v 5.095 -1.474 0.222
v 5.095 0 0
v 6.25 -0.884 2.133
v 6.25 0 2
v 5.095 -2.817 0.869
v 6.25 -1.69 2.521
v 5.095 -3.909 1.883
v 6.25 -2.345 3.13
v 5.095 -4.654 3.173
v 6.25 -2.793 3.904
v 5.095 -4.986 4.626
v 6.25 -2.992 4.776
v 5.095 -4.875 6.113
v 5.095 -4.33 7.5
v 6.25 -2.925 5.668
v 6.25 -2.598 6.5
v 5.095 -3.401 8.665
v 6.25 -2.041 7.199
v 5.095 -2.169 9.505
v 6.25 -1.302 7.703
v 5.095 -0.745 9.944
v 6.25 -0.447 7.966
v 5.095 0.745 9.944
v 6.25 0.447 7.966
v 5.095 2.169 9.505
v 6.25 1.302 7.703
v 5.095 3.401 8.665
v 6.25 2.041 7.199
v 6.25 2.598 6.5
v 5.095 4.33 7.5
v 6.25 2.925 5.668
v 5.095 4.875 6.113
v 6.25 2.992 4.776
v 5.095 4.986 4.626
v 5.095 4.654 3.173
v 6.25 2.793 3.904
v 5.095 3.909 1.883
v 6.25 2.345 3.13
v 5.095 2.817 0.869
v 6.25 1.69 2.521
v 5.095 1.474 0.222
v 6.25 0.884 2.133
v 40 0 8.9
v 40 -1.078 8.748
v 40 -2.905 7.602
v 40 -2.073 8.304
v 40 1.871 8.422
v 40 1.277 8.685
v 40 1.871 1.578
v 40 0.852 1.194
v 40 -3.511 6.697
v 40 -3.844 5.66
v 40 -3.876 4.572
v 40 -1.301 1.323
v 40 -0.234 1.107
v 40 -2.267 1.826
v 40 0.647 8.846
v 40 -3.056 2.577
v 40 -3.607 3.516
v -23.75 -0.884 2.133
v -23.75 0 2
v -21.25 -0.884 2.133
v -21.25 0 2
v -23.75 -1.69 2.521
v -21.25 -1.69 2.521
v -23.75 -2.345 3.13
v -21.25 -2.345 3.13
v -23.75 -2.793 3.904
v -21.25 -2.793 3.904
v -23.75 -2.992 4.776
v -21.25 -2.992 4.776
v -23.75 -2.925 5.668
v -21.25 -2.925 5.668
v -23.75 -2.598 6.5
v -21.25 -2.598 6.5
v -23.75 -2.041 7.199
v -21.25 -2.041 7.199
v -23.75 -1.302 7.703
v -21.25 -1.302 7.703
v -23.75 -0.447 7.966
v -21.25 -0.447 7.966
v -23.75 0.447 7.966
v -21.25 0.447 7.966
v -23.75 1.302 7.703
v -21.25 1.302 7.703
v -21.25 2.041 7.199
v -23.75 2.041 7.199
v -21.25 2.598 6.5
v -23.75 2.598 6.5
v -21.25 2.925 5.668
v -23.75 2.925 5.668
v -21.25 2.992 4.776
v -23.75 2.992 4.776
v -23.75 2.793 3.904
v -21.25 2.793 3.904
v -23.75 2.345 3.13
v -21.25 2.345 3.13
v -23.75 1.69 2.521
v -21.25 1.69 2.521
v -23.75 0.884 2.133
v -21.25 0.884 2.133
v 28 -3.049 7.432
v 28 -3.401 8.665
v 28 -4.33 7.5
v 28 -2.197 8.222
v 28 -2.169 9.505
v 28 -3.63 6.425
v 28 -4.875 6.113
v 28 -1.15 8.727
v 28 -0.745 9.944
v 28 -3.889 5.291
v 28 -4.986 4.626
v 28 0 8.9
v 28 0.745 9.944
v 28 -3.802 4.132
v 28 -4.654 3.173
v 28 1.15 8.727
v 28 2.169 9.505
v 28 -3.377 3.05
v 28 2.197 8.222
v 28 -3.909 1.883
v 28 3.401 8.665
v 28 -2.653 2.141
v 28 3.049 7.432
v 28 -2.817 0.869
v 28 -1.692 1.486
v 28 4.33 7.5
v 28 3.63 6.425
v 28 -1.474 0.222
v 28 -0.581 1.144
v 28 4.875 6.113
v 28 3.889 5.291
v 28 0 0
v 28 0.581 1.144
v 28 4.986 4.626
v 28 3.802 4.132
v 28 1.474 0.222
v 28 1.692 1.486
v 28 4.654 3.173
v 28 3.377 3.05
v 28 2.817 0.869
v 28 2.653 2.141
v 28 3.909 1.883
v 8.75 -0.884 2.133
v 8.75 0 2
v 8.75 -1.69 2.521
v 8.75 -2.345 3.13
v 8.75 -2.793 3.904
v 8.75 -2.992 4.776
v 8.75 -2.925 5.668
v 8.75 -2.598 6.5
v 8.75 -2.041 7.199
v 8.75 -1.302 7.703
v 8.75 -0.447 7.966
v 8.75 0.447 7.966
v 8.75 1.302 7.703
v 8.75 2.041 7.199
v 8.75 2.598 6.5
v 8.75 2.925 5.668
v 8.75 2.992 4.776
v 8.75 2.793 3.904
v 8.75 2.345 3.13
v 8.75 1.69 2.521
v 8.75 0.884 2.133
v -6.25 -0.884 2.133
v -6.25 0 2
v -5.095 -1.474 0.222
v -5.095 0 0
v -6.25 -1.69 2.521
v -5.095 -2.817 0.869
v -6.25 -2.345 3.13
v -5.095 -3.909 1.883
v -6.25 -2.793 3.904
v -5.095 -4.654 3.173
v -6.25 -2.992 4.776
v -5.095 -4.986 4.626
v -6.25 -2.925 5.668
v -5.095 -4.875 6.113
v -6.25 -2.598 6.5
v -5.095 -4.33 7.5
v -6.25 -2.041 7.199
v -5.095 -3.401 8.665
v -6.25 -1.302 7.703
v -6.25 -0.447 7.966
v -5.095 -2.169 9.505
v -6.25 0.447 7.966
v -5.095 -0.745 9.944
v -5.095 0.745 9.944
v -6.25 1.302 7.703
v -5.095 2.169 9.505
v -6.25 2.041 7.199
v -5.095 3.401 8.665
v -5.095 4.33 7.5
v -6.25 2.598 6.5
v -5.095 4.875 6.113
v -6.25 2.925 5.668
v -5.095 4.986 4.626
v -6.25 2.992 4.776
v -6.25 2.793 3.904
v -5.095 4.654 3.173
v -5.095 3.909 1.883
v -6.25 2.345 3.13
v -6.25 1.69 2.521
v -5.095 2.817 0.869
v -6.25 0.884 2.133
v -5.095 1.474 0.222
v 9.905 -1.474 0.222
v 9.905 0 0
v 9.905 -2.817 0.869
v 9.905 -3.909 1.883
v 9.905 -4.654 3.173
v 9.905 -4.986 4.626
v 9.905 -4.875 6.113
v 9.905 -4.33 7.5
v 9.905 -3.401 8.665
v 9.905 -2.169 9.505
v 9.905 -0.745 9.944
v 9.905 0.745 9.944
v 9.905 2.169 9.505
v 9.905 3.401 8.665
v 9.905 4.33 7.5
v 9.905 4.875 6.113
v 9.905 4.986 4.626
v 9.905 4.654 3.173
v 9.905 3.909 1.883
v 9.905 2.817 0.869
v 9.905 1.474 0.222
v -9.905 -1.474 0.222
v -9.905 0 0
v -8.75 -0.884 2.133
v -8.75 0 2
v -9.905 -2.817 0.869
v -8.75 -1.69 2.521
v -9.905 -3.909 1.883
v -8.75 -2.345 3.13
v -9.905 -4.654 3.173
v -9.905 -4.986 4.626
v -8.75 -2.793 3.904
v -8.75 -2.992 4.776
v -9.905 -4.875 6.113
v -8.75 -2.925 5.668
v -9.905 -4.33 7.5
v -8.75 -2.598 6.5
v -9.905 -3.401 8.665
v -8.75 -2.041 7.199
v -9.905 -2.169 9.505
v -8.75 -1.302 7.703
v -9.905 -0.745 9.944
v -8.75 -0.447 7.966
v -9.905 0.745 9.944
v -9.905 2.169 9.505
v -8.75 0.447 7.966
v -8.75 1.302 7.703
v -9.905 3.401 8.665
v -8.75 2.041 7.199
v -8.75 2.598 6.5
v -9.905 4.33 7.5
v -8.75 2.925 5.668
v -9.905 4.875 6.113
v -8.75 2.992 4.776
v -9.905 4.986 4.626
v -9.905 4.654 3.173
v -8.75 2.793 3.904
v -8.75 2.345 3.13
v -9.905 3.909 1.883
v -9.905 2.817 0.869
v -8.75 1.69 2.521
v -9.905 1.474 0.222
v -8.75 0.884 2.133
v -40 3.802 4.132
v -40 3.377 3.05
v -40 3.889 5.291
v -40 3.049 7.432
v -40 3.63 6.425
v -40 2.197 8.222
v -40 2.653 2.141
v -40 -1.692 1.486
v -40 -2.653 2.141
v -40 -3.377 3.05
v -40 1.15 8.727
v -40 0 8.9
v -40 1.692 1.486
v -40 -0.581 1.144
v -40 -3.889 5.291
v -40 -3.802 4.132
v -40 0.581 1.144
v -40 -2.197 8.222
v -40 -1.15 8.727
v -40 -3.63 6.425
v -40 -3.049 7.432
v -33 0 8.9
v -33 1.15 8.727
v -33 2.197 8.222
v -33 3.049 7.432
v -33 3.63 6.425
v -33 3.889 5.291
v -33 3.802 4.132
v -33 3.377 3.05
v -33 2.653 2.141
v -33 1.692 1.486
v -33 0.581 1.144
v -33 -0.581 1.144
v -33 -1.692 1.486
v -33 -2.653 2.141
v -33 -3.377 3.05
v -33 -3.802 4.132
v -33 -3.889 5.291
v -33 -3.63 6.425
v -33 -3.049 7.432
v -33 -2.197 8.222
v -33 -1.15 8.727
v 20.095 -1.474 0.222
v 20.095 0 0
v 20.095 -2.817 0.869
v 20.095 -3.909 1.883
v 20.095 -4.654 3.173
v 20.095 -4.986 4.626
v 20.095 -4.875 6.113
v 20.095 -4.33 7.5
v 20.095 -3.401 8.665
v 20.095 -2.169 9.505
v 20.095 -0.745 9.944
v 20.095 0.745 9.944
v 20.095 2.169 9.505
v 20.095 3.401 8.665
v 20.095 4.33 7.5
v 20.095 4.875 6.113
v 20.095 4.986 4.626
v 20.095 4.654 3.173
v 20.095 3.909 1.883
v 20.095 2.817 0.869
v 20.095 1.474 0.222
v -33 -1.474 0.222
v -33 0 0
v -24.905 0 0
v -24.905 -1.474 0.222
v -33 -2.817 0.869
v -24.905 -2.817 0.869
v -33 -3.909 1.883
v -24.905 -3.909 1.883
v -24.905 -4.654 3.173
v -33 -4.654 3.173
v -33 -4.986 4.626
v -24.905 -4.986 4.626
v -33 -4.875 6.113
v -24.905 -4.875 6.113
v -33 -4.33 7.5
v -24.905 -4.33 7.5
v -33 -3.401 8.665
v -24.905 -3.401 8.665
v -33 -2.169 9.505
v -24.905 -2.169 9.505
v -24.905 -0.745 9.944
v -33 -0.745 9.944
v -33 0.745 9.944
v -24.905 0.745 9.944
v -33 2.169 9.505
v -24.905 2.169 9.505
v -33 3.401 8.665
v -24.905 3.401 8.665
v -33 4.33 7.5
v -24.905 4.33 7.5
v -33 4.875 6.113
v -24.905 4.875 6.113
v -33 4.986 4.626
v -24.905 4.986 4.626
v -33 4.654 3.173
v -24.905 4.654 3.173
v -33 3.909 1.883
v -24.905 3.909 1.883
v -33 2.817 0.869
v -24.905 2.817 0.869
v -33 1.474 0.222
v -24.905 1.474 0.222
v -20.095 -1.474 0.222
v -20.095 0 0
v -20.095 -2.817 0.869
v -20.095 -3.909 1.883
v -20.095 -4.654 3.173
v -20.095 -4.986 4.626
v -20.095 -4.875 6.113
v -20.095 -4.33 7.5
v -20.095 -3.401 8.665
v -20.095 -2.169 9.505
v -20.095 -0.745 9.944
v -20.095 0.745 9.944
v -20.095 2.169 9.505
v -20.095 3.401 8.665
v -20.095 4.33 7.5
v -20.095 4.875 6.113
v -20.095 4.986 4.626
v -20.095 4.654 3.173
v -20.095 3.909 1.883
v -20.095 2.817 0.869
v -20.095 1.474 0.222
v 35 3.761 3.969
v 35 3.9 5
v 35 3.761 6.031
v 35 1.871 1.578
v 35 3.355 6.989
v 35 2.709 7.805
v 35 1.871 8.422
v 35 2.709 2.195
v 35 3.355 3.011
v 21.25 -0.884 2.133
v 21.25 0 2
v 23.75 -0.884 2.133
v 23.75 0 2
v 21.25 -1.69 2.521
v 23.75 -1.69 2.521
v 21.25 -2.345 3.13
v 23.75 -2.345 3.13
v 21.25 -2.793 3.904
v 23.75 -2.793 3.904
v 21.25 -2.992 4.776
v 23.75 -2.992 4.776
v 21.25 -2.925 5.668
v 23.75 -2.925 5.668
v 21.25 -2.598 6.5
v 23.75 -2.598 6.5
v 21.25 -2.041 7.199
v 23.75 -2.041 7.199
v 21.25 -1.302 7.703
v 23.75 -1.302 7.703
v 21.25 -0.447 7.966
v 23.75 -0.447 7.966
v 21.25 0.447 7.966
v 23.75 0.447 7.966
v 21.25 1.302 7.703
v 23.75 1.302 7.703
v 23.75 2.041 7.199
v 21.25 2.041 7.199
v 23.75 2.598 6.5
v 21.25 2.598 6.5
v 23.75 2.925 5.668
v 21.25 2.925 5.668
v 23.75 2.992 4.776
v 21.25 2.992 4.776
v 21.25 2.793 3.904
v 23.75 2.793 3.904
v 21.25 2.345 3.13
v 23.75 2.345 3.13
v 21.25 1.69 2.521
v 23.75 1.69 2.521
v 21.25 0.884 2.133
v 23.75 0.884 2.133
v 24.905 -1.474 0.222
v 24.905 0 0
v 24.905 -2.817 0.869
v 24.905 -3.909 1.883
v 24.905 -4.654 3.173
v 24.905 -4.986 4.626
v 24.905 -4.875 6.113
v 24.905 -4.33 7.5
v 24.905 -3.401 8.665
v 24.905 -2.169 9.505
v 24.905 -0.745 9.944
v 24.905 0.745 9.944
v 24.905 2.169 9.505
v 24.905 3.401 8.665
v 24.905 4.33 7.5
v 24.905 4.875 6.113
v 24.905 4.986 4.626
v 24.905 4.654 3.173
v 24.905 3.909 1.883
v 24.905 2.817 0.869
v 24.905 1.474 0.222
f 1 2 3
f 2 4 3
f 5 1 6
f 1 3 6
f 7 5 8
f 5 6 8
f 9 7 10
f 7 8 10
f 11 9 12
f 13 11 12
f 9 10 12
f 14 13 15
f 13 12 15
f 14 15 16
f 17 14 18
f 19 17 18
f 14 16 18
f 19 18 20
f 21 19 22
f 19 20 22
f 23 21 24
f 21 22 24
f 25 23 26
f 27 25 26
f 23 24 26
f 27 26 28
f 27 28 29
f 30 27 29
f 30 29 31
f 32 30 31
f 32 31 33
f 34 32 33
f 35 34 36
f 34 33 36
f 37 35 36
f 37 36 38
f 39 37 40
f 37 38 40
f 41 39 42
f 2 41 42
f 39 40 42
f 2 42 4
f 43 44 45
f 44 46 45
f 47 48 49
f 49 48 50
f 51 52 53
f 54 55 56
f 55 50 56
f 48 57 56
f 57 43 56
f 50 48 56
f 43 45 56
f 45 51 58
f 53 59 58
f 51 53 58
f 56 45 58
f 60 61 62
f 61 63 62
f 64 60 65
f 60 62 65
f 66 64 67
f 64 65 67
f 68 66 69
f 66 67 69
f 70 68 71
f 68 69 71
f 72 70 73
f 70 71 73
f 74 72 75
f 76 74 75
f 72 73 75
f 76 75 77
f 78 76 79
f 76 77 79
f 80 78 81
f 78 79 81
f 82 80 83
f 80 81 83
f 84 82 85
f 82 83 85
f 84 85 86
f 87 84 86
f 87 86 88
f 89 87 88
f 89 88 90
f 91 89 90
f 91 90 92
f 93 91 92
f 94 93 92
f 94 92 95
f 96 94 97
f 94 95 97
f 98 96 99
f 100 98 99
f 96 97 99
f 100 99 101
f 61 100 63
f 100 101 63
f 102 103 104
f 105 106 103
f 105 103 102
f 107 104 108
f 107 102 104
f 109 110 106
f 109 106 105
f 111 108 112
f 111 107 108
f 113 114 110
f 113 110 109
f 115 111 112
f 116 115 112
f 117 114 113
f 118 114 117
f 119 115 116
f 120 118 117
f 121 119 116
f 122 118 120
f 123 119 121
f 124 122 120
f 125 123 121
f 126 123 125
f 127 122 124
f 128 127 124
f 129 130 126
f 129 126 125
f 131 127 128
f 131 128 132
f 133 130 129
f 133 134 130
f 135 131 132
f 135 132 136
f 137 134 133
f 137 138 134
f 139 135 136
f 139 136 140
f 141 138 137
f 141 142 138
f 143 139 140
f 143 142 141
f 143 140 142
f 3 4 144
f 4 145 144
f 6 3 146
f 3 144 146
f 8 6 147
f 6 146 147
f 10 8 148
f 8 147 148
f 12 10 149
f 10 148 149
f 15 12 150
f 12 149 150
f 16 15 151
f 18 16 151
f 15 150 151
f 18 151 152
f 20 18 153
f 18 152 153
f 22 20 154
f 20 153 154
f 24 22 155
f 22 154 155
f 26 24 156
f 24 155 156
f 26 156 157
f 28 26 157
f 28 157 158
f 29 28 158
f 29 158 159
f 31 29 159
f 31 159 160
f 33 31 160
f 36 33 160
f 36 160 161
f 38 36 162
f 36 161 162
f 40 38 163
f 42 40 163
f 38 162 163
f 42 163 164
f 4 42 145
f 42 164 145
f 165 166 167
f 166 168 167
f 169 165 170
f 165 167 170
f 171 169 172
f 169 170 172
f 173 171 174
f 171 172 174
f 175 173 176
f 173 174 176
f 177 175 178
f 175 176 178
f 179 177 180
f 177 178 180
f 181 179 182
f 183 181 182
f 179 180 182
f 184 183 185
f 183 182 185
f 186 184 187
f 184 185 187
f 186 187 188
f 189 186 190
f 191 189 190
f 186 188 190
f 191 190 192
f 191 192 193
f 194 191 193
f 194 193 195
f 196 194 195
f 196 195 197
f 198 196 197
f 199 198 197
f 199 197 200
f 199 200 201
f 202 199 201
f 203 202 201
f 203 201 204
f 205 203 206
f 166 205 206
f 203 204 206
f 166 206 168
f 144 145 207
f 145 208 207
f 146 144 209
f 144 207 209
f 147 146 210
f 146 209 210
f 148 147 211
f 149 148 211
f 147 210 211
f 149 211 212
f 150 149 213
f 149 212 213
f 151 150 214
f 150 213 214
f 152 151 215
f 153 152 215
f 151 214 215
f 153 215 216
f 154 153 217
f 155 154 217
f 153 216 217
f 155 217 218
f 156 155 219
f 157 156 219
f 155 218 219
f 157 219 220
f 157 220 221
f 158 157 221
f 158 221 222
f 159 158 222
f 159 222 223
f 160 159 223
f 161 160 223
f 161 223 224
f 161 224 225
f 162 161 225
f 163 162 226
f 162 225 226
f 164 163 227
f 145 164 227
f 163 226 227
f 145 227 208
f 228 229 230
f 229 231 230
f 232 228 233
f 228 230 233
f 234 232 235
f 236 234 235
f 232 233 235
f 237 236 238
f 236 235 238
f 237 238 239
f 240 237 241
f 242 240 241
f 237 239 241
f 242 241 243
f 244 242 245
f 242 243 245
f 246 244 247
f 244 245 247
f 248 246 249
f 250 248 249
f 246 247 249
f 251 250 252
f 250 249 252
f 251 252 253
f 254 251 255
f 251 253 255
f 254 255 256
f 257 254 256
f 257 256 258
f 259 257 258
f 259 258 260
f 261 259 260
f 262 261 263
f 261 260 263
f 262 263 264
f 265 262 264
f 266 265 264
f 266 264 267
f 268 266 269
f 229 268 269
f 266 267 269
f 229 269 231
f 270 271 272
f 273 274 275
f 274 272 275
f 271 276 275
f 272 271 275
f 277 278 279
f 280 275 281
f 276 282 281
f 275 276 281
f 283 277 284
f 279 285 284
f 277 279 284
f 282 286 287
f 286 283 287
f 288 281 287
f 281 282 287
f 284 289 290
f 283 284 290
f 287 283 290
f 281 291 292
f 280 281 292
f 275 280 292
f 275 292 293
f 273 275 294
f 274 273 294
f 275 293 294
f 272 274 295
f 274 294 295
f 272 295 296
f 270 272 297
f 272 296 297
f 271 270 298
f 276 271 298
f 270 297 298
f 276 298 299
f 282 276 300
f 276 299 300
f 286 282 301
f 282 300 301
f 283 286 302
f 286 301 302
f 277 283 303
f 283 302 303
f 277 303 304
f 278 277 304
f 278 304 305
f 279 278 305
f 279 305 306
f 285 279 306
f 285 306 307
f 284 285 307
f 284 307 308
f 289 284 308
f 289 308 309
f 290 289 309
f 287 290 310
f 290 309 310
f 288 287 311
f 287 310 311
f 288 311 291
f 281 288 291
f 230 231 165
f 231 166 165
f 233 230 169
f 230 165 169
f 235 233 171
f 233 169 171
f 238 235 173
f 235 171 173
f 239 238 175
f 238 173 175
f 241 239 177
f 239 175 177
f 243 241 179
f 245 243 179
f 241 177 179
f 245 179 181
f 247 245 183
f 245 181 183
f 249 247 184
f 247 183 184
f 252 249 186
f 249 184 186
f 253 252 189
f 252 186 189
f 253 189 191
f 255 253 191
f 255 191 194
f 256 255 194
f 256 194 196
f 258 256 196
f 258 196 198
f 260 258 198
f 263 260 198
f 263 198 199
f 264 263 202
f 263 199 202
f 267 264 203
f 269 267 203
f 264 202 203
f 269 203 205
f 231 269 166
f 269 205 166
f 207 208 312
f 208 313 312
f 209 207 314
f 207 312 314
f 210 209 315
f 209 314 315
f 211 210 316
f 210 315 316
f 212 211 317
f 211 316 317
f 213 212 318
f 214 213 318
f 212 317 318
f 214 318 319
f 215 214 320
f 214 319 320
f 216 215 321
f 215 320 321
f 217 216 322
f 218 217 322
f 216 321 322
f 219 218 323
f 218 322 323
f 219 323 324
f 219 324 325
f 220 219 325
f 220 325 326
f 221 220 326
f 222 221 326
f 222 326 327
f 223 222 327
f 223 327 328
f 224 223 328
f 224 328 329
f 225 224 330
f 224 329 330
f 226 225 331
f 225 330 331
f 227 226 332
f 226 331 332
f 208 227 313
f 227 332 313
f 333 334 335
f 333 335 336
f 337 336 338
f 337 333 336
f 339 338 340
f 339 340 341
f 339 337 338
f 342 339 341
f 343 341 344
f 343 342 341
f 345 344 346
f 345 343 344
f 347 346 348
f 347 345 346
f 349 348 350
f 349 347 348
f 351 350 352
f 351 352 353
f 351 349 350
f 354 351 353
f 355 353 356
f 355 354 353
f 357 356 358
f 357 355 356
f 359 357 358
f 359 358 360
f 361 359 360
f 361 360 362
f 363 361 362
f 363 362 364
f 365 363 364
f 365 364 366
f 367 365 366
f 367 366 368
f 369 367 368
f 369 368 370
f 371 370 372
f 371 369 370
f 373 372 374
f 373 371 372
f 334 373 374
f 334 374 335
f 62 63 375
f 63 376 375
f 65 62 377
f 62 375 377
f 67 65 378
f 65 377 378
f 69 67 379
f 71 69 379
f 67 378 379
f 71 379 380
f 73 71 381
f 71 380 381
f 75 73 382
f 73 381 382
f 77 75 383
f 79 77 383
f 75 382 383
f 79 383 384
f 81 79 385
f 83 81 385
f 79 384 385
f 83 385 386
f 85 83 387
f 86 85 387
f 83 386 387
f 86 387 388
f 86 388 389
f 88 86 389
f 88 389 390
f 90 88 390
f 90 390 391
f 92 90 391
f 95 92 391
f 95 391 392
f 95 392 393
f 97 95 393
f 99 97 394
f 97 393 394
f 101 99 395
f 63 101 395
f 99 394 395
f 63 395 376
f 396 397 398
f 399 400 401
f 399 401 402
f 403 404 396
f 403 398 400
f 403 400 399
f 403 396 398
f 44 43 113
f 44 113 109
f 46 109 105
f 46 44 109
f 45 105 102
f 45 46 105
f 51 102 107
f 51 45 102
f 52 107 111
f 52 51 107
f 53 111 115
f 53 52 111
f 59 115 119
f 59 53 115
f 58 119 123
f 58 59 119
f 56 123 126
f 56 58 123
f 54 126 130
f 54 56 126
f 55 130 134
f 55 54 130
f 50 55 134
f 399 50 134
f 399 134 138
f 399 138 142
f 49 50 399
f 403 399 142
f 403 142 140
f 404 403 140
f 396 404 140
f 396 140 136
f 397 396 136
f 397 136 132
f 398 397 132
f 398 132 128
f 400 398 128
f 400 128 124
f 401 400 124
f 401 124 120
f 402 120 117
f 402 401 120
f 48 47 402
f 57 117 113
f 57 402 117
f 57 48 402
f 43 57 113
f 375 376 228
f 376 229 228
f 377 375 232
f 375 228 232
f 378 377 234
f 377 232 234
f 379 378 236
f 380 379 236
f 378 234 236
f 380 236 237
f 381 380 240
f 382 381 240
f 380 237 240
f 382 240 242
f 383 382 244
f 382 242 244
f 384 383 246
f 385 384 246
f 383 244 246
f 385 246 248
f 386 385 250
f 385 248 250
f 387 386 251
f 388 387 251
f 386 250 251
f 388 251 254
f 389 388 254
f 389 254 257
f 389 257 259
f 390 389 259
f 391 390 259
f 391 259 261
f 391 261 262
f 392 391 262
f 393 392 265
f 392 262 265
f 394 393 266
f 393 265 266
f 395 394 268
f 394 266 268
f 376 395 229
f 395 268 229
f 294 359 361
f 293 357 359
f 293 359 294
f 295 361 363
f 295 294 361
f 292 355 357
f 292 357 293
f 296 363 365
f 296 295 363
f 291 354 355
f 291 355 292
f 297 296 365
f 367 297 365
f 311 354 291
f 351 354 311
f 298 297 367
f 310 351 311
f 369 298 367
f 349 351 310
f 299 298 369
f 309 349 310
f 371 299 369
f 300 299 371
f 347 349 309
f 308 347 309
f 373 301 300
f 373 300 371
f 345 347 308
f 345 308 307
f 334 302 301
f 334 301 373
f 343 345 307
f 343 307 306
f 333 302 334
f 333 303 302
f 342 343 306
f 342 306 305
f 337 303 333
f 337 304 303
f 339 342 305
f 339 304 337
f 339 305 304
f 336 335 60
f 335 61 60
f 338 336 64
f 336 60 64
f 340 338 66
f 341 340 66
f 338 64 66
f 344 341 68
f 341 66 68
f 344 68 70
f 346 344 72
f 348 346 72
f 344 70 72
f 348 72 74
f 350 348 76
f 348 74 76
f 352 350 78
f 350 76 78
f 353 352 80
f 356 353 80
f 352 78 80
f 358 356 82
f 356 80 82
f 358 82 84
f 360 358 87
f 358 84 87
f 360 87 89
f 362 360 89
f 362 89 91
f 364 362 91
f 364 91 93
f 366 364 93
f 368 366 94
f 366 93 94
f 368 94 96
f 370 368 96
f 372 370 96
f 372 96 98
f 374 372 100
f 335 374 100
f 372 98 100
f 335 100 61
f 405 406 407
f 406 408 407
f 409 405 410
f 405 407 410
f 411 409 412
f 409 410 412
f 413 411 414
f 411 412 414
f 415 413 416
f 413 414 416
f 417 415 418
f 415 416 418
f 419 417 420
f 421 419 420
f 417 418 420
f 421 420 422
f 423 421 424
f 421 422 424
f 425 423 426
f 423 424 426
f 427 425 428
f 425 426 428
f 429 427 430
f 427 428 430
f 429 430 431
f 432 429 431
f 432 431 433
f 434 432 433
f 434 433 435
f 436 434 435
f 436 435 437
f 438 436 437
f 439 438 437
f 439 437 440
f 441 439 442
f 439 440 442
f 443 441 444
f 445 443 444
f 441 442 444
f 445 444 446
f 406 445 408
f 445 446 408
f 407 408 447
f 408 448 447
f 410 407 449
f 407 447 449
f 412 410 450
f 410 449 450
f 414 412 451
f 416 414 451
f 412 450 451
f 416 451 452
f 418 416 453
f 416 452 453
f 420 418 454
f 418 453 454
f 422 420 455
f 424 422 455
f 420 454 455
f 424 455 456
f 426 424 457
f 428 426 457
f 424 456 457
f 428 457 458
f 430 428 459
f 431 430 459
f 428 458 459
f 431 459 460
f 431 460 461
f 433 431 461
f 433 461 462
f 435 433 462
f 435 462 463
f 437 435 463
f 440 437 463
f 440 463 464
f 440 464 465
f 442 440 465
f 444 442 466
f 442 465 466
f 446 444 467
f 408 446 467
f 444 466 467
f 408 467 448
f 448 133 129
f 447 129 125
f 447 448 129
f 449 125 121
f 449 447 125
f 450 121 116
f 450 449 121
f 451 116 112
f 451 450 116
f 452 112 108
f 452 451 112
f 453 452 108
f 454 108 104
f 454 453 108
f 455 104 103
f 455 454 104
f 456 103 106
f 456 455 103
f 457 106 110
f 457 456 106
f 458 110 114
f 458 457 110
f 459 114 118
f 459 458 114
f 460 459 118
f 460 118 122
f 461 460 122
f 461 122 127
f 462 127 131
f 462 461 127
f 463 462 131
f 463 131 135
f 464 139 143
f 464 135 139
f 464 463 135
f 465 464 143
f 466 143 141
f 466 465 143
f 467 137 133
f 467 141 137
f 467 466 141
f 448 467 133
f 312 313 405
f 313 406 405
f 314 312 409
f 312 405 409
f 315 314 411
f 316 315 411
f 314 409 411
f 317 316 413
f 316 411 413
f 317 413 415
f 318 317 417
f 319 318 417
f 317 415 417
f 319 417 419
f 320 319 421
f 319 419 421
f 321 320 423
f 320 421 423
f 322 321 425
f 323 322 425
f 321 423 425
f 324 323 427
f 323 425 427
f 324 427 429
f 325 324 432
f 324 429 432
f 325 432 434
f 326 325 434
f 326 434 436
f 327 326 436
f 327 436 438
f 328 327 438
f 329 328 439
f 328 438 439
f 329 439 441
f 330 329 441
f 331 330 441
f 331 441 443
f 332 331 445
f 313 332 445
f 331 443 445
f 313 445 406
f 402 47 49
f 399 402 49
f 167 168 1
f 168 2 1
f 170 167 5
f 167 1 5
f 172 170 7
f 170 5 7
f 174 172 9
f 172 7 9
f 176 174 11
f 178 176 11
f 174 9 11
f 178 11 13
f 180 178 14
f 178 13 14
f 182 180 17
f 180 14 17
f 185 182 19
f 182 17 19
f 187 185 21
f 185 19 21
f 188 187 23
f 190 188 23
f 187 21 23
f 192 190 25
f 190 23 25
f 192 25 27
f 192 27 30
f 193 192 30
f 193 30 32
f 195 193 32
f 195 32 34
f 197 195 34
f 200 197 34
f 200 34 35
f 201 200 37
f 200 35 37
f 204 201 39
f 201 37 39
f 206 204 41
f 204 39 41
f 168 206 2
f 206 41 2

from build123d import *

# Parameters (mm, degrees)
CUT_EXTRUDE2_START = -7
SKETCH4_R          = 5
SKETCH4_R_2        = 3.9
CUT_EXTRUDE2_DEPTH = 7
SKETCH3_R          = 5
SKETCH3_R_2        = 3.9
CUT_EXTRUDE4_DEPTH = 12
CUT_EXTRUDE5_DEPTH = 5


with BuildPart() as part:
    # Sketch2 → Revolve1 (revolve)
    with BuildSketch(Plane(origin=(0, 0, 0), x_dir=(1, 0, 0), z_dir=(0, 1, 0))):
        Polygon((40, -5), (-40, -5), (-40, 0), (-30.049059985, 0), (-24.904700538, 0), (-23.75, -2), (-21.25, -2), (-20.095299462, 0), (-9.904700538, 0), (-8.75, -2), (-6.25, -2), (-5.095299462, 0), (5.095299462, 0), (6.25, -2), (8.75, -2), (9.904700538, 0), (20.095299462, 0), (21.25, -2), (23.75, -2), (24.904700538, 0), (30.049059985, 0), (40, 0), align=None)
    revolve(axis=Axis((40, 0, 5), (-1, 0, 0)))

    # Sketch4 → Cut-Extrude2 (cut)
    with BuildSketch(Plane.ZY.offset(40).offset(CUT_EXTRUDE2_START)):
        with Locations(Location((5, 0, 0), (0, 0, 180))):
            Circle(SKETCH4_R)
        with Locations((5, 0)):
            Circle(SKETCH4_R_2, mode=Mode.SUBTRACT)
    extrude(amount=CUT_EXTRUDE2_DEPTH, mode=Mode.SUBTRACT)

    # Sketch3 → Cut-Extrude4 (cut)
    with BuildSketch(Plane(origin=(40, 0, 0), x_dir=(0, 0, -1), z_dir=(1, 0, 0))):
        with Locations((-5, 0)):
            Circle(SKETCH3_R)
        with Locations(Location((-5, 0, 0), (0, 0, 180))):
            Circle(SKETCH3_R_2, mode=Mode.SUBTRACT)
    extrude(amount=-CUT_EXTRUDE4_DEPTH, mode=Mode.SUBTRACT)

    # Sketch5 → Cut-Extrude5 (cut)
    with BuildSketch(Plane(origin=(40, 0, 0), x_dir=(0, 0, -1), z_dir=(1, 0, 0))):
        with BuildLine():
            Line((-8.421971662, 1.870858078), (-1.578028338, 1.870858078))
            ThreePointArc((-1.578028338, 1.870858078), (-5, 3.9), (-8.421971662, 1.870858078))
        make_face()
    extrude(amount=-CUT_EXTRUDE5_DEPTH, mode=Mode.SUBTRACT)


solid = part.part
